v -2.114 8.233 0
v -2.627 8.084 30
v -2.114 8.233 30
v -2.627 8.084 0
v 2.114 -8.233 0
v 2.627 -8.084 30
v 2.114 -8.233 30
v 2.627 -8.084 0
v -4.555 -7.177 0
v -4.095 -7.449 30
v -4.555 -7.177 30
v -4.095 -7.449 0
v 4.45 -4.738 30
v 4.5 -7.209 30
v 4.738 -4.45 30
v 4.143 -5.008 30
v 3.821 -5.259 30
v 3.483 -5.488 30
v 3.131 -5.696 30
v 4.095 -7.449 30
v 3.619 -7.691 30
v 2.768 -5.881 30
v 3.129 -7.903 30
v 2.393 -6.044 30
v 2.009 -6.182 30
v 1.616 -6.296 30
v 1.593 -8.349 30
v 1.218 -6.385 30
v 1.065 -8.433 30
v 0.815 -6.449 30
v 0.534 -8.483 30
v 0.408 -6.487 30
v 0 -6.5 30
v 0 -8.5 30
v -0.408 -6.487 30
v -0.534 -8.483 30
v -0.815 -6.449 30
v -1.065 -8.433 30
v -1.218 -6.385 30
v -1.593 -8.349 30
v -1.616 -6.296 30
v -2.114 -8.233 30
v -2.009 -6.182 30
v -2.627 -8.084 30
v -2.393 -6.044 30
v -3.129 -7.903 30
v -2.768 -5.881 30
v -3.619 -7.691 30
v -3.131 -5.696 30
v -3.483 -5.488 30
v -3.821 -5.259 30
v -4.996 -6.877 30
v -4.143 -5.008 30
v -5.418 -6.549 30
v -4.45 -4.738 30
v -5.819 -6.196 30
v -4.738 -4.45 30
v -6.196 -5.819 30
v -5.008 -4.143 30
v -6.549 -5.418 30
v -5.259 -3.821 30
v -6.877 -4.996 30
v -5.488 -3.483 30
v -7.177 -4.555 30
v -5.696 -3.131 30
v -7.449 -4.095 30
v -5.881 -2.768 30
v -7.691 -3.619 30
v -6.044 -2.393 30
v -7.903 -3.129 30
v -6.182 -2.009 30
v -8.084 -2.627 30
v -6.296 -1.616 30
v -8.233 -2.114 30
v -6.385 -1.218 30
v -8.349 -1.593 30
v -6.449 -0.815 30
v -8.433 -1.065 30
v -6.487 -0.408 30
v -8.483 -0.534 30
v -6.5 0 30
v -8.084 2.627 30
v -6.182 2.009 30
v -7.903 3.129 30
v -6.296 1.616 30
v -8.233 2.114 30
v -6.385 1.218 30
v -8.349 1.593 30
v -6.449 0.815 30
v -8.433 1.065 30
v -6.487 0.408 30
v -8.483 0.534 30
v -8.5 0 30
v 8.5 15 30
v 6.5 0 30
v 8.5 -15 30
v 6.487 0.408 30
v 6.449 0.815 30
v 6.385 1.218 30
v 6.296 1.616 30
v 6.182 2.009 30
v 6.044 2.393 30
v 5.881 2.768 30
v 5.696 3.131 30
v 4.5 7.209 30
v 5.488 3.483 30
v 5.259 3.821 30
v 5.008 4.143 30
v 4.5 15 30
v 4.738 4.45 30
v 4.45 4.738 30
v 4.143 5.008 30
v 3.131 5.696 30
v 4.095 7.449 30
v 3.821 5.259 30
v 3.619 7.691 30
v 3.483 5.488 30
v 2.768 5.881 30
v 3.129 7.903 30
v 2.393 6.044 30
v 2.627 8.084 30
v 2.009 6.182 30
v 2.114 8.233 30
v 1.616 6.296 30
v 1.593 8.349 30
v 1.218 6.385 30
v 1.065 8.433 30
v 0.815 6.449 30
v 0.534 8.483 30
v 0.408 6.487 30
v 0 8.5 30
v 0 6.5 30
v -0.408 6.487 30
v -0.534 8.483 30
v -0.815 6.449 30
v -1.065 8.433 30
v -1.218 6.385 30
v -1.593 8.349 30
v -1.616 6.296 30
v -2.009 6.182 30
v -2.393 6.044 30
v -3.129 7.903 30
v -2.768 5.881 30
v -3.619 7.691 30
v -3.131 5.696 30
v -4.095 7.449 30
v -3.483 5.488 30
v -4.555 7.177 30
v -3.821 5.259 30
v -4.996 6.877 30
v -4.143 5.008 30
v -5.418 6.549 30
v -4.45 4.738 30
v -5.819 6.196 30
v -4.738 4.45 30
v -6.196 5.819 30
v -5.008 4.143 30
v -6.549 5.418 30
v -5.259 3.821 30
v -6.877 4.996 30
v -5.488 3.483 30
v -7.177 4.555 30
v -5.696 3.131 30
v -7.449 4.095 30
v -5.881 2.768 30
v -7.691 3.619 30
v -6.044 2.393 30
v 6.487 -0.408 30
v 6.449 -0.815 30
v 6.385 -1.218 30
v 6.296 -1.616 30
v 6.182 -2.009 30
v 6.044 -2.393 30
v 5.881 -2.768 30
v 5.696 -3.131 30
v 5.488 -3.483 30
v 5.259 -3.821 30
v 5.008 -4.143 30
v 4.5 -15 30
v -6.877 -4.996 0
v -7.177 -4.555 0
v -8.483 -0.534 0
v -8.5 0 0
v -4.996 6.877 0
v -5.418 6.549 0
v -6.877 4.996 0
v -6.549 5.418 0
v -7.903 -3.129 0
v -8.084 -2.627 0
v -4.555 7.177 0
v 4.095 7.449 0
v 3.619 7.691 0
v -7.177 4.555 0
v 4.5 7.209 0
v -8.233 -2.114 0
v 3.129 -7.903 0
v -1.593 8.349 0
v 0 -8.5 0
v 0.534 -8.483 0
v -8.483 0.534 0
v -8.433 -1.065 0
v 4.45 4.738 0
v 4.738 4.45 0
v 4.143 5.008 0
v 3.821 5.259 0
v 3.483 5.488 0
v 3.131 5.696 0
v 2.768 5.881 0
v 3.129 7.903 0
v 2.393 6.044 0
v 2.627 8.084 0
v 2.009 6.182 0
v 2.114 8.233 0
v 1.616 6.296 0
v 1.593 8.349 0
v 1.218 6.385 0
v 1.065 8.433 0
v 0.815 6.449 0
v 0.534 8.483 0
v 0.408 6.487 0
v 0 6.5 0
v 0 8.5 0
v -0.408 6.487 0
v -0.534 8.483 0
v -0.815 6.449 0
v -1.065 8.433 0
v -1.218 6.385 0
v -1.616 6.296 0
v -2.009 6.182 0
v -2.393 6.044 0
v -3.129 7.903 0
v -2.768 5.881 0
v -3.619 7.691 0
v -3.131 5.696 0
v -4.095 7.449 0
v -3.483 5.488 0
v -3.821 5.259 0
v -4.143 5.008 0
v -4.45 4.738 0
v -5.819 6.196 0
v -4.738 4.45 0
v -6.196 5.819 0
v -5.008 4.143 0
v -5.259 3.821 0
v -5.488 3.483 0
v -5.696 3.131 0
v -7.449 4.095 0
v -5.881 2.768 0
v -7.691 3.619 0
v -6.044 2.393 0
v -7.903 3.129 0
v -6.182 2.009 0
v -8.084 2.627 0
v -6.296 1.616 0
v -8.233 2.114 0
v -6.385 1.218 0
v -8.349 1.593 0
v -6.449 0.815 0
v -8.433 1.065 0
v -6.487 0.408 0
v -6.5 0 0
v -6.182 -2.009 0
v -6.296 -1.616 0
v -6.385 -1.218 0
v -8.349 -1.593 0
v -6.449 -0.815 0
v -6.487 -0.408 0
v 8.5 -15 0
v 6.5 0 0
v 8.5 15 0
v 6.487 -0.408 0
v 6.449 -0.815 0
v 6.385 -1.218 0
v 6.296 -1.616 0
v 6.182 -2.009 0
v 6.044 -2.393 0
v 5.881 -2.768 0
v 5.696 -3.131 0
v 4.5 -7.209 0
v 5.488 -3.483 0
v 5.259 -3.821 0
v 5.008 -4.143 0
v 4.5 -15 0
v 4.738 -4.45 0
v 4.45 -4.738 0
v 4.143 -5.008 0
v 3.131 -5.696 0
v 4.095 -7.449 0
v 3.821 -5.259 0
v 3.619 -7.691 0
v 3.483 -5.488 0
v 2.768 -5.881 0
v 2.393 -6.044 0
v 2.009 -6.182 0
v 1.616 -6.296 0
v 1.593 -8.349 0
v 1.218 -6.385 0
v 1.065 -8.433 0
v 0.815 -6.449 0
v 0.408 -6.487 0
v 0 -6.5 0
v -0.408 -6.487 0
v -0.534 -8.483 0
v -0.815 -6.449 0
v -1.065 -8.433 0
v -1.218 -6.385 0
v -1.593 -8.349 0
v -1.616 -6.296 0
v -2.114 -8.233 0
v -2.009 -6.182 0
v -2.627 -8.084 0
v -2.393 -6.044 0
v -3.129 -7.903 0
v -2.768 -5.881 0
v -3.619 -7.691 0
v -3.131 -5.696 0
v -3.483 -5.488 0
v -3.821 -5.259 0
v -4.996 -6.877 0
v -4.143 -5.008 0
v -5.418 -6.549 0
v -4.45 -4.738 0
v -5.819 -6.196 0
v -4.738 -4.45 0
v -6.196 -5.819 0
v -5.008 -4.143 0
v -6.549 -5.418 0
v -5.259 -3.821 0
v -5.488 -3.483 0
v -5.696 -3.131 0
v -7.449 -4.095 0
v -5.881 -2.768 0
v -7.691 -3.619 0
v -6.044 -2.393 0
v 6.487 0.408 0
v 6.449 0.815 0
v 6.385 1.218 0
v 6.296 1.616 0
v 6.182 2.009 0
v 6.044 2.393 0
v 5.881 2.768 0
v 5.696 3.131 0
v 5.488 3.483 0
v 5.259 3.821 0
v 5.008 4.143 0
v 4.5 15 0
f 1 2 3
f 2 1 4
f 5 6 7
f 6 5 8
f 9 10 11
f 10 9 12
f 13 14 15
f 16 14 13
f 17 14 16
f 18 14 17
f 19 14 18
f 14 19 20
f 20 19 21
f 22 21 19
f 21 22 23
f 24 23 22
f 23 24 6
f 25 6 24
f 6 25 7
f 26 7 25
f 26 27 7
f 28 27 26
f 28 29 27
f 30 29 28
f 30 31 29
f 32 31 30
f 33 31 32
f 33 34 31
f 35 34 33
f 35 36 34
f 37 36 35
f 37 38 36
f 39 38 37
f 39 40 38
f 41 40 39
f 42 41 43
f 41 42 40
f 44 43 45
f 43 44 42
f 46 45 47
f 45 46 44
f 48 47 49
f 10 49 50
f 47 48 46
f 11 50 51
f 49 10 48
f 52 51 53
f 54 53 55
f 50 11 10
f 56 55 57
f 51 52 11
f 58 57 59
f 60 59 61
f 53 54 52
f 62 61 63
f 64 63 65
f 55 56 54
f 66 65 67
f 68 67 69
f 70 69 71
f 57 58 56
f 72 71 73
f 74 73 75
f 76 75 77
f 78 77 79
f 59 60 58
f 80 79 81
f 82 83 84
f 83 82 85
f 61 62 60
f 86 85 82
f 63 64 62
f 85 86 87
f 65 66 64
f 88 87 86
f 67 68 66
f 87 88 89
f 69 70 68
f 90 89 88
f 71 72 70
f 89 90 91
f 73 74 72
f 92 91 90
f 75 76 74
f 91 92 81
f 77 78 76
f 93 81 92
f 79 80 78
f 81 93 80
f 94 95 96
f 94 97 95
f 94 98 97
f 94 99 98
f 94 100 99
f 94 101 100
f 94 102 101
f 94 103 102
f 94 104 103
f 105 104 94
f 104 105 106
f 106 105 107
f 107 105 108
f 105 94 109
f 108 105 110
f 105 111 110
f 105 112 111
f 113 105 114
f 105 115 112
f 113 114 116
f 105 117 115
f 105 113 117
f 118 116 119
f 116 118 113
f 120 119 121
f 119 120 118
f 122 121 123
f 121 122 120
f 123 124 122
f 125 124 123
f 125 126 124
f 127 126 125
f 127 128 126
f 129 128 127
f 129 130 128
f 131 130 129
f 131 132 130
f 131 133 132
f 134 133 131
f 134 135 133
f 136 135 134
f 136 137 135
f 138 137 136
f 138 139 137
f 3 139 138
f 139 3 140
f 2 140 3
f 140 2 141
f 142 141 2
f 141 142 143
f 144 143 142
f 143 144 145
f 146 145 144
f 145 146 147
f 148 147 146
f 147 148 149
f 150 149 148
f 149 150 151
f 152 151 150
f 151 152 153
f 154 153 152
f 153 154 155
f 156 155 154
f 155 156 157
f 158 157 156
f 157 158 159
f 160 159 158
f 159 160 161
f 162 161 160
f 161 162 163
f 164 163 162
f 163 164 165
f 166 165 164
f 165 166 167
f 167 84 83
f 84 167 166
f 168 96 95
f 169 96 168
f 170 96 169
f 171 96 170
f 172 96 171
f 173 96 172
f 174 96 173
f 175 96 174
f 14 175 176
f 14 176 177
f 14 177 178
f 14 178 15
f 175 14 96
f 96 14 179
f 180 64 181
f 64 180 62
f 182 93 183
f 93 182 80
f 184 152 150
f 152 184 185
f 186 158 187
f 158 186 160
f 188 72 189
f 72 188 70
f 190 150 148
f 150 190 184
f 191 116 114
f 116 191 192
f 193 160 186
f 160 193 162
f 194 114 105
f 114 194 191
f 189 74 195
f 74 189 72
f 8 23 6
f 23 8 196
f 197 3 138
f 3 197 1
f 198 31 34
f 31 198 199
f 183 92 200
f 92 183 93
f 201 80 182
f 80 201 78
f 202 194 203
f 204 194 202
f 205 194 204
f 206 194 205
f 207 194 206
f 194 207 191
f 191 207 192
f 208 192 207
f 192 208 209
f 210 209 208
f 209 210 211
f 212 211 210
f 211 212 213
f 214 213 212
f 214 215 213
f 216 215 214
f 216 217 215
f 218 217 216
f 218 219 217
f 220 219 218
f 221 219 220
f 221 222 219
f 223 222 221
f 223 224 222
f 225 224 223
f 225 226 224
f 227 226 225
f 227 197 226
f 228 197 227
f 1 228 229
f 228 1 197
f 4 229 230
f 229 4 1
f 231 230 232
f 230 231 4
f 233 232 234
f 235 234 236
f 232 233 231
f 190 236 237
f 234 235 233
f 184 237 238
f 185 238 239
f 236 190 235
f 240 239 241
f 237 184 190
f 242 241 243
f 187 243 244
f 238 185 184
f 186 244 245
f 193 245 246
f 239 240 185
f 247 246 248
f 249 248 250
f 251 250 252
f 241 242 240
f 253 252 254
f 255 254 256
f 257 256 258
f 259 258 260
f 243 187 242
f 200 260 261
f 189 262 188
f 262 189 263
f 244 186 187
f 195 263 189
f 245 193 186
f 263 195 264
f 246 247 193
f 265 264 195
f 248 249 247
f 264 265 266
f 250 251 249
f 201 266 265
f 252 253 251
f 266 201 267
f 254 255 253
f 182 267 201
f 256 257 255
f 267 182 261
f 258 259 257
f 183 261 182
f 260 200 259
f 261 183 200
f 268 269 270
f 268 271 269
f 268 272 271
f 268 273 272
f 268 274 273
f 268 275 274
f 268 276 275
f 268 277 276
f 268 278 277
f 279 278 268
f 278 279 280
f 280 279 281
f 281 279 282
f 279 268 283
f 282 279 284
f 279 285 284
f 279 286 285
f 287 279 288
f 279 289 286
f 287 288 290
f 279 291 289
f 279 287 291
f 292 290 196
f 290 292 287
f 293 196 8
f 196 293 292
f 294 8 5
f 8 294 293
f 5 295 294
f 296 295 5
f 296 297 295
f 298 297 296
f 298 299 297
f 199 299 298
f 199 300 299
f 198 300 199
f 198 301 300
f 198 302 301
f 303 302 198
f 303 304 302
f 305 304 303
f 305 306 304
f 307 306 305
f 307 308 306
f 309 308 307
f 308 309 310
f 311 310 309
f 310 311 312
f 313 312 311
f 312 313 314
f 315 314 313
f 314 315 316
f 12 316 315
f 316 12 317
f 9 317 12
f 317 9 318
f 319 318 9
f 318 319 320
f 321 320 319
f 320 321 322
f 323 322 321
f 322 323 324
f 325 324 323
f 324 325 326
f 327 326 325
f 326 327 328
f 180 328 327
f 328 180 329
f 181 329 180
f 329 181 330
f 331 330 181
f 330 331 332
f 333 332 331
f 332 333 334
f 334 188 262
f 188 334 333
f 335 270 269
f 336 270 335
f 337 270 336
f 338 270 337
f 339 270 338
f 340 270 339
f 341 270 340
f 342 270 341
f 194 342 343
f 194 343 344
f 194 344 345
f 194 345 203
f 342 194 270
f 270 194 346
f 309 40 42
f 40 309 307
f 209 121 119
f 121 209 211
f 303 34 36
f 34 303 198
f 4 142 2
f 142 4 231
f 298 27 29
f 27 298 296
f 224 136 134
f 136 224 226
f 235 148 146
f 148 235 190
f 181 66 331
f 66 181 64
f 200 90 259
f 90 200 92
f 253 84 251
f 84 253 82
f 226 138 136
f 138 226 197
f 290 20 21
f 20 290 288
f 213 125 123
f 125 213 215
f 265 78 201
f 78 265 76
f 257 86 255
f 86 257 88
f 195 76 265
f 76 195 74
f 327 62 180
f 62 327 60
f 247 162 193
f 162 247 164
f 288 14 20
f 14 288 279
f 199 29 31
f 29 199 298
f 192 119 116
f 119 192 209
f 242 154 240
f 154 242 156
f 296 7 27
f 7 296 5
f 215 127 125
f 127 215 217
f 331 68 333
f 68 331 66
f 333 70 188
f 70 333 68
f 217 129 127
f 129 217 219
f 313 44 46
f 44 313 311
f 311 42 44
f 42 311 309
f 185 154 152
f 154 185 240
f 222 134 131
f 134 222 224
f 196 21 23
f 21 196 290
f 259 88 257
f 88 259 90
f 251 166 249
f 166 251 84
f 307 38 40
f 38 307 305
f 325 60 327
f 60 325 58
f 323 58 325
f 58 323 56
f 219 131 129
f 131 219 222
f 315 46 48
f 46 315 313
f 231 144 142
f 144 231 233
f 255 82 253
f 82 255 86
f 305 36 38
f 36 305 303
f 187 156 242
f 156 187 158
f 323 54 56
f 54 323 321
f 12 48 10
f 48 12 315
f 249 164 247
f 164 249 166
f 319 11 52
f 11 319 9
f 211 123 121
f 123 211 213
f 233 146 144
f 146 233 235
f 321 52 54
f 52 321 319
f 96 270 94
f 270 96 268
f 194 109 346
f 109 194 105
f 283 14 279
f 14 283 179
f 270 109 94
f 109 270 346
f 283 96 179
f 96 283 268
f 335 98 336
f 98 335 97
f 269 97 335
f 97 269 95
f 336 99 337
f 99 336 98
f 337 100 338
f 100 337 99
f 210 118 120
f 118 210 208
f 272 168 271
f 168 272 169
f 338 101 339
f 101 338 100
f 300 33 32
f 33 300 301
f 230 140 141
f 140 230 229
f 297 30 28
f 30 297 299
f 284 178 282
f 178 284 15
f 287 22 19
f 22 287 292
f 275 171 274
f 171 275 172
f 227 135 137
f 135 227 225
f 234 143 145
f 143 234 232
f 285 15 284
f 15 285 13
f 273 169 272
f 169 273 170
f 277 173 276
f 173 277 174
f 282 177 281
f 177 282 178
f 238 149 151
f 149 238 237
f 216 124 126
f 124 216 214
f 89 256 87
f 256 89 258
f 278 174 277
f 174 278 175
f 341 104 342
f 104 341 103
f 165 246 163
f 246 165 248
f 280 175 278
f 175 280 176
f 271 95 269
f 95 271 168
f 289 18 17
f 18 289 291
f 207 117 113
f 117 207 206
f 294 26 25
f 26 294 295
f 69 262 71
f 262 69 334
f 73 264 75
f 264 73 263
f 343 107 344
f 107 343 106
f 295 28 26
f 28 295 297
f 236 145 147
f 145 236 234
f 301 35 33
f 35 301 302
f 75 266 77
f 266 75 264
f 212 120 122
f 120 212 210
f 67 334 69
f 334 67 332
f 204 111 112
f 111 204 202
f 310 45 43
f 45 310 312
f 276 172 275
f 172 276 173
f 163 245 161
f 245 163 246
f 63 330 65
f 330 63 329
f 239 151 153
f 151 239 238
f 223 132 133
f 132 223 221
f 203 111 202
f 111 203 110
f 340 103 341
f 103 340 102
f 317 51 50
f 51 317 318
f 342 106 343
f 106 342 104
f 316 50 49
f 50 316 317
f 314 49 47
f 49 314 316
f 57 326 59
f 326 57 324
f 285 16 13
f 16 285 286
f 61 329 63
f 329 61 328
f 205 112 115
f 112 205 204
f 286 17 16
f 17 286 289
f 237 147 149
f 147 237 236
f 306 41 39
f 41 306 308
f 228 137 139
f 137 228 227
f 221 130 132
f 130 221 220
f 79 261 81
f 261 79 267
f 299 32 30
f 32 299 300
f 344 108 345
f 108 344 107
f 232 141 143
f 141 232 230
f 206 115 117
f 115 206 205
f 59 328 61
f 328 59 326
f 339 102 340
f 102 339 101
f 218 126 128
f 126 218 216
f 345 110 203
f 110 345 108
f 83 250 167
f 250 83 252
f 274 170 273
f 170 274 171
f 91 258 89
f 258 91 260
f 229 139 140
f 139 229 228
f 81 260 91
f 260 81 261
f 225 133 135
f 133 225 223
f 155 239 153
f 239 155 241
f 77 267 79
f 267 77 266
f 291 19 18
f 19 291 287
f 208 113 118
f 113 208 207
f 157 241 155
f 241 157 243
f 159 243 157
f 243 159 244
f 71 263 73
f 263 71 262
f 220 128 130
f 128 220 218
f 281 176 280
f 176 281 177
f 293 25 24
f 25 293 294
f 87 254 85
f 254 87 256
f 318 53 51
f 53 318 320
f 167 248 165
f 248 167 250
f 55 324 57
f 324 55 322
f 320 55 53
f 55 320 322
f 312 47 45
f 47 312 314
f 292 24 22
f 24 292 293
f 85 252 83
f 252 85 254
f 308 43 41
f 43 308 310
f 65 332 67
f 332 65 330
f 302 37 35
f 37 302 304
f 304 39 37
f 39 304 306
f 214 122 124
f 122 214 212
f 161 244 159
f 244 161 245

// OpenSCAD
        //all units in mm
$fn = 100;

//capSpec
poleDia = 13;
wallThickness = 2;
capHeight = 65;

//mountingPlate Spec     
mpWidth = 65;
mpHeight = 65;
sheetThickness = 3.175 * 2;

screwDia = 5;

module mountingPlate(display=false){
    difference(){
        cube([mpWidth, wallThickness, mpHeight]);
        
       translate([0,0,mpHeight]){
            rotate([0,45,0]){
            translate([0,-.5,0]){
            cube([sqrt(pow(mpWidth, 2)+pow(mpHeight, 2)), sheetThickness+1, 999]);
            }
        }
    }     
        
    adjW = mpWidth - poleDia/2;
    adjH = mpHeight - wallThickness;
    
    echo("Width:");
    echo(adjW);
    echo("Height:");
    echo (adjH);
    
    
        if(display){
            translate([0,sheetThickness/2, 0 ]){
                cylinder(capHeight, d=poleDia);
            }
             cube([mpWidth, sheetThickness, wallThickness]);
        }
     
    }
}
//mountingPlate(true);


module cap(){

            
        difference(){
            union(){
            cylinder(capHeight, d=poleDia+2*wallThickness);
               translate([0,-sheetThickness/2, 0 ]){
                    cube([mpWidth, sheetThickness, wallThickness]);
               }
               translate([0,sheetThickness/2, 0 ]){
                    mountingPlate();
                    }
                    
                translate([0,-sheetThickness/2-wallThickness, 0 ]){
                    mountingPlate();
                    }
                }
            

            translate([0, 0, wallThickness]){
                cylinder(capHeight, d=poleDia);
            }
            
          translate([mpWidth-5,-30,-20]){
                cube([300,300, 300]);
           }
        }
}
//cap();

holderHeight = 30;

module poleHolder(holeDepth = -10){
    difference(){

    union(){
            cylinder(holderHeight, d=poleDia+2*wallThickness);
               translate([poleDia/2-wallThickness,-holderHeight/2, 0 ]){
                    cube([wallThickness*2, holderHeight, holderHeight]);
               }
           }

      translate([0, 0, holeDepth]){
            cylinder(capHeight*2, d=poleDia);
         }
    }
}

poleHolder();
